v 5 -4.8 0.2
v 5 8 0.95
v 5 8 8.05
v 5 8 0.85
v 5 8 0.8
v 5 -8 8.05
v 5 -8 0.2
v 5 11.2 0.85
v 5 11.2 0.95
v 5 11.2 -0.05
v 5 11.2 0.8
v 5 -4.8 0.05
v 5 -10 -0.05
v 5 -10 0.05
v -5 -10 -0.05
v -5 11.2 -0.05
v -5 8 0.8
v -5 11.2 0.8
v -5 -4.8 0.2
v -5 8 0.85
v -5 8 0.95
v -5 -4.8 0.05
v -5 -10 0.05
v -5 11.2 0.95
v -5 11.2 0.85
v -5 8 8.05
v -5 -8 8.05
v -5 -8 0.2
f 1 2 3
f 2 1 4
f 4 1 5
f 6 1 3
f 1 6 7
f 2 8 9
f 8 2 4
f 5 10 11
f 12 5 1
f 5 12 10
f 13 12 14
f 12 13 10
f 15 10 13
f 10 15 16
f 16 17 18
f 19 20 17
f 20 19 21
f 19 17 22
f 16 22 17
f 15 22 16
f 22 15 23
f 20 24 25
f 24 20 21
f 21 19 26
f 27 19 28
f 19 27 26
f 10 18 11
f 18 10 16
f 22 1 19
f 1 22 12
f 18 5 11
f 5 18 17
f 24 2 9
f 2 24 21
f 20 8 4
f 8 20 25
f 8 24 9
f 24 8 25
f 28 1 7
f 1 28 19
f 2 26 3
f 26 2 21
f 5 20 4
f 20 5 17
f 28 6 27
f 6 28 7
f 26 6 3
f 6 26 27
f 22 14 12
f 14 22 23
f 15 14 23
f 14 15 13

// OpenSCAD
//////////////////F.A.R///////////////////
/*

First Attempt: 10/30/2016
Goals: Generate F.A.R from site input

*/

////////////////Parameters////////////////
/* [Global] */

/* [Location] */
Location="New_York"; // [New_York, Chicago]

/* [Zoning] */
Zoning="R9A"; // [R9A, R9X, R10]

/* [Site Lenght (x10 Feet)] */
Site_lenght=20;// [1:500]

/* [Site Width Feet] */
Site_width=10;// [1:500] 

/* [Site Situation] */
Placement="Corner_Lot"; // [Corner_Lot, Interior_Lot]
Frontage="Wide_Street"; // [Wide_Street, Narrow_Street]

/* [Extra] */
Inclusionary_Housing_Public_Plaza="Yes"; // [Yes, No]


/* [Hidden] */
Slab=0.1;
Hollow=0.8;
Bleu=[.3,.3,.3,.7];
Vitres=[.6,.7,1,.3];
Base=[.8,.3,.3,.8];

Area=(Site_lenght*Site_width);

Building_Width=((0.8*(Site_width*Site_lenght))/Site_width);
Base_Setback=(Site_lenght-Building_Width);

////////////////Renders//////////////////
  translate ([0,0,0]){
      cube([Site_width,Site_lenght,0.1],true,Color(Base));
  }


if ((Location=="New_York")&&(Zoning=="R9A")&&(Placement=="Corner_Lot")&&(Frontage=="Wide_Street")&&(Inclusionary_Housing_Public_Plaza=="Yes")){
   FAR=8.5;  
     scale([1,0.8,1]){
      translate([0,Base_Setback,0])
       Ground_Floor();}
        for (FAR=[2:1:8]){
            translate ([0,0,FAR-.9])
             scale([1,0.8,1])
              Upper_Floor ();
        }
}                        
if (Location=="Chicago"){
    for (FAR=[8:1:FAR]){
      translate([0,0,FAR-1])
        intersection(){
            Upper_Floor ();
                Setback_Two ();
        }
    } 
}

///////////////Module///////////////////
module Ground_Floor (){
      color(Bleu)
        cube([Site_width,Site_lenght,Slab],true);
      translate([0,0,.4])
        color(Vitres)
         cube([Site_width,Site_lenght,Hollow],true);
      translate([0,0,.9])
           color(Bleu)
            cube([Site_width,Site_lenght,Slab],true);
}
module Upper_Floor (){
     color(Vitres)
        cube([Site_width,Site_lenght,Hollow+1],true);
      translate([0,0,.9])
           color(Bleu)
            cube([Site_width,Site_lenght,Slab],true);
}
module Setback_One (){
    scale(.8,.9,0)
       Upper_Floor ();
}    
module Setback_Two (){
    scale(.5,.6,0)
       Upper_Floor ();
} 
